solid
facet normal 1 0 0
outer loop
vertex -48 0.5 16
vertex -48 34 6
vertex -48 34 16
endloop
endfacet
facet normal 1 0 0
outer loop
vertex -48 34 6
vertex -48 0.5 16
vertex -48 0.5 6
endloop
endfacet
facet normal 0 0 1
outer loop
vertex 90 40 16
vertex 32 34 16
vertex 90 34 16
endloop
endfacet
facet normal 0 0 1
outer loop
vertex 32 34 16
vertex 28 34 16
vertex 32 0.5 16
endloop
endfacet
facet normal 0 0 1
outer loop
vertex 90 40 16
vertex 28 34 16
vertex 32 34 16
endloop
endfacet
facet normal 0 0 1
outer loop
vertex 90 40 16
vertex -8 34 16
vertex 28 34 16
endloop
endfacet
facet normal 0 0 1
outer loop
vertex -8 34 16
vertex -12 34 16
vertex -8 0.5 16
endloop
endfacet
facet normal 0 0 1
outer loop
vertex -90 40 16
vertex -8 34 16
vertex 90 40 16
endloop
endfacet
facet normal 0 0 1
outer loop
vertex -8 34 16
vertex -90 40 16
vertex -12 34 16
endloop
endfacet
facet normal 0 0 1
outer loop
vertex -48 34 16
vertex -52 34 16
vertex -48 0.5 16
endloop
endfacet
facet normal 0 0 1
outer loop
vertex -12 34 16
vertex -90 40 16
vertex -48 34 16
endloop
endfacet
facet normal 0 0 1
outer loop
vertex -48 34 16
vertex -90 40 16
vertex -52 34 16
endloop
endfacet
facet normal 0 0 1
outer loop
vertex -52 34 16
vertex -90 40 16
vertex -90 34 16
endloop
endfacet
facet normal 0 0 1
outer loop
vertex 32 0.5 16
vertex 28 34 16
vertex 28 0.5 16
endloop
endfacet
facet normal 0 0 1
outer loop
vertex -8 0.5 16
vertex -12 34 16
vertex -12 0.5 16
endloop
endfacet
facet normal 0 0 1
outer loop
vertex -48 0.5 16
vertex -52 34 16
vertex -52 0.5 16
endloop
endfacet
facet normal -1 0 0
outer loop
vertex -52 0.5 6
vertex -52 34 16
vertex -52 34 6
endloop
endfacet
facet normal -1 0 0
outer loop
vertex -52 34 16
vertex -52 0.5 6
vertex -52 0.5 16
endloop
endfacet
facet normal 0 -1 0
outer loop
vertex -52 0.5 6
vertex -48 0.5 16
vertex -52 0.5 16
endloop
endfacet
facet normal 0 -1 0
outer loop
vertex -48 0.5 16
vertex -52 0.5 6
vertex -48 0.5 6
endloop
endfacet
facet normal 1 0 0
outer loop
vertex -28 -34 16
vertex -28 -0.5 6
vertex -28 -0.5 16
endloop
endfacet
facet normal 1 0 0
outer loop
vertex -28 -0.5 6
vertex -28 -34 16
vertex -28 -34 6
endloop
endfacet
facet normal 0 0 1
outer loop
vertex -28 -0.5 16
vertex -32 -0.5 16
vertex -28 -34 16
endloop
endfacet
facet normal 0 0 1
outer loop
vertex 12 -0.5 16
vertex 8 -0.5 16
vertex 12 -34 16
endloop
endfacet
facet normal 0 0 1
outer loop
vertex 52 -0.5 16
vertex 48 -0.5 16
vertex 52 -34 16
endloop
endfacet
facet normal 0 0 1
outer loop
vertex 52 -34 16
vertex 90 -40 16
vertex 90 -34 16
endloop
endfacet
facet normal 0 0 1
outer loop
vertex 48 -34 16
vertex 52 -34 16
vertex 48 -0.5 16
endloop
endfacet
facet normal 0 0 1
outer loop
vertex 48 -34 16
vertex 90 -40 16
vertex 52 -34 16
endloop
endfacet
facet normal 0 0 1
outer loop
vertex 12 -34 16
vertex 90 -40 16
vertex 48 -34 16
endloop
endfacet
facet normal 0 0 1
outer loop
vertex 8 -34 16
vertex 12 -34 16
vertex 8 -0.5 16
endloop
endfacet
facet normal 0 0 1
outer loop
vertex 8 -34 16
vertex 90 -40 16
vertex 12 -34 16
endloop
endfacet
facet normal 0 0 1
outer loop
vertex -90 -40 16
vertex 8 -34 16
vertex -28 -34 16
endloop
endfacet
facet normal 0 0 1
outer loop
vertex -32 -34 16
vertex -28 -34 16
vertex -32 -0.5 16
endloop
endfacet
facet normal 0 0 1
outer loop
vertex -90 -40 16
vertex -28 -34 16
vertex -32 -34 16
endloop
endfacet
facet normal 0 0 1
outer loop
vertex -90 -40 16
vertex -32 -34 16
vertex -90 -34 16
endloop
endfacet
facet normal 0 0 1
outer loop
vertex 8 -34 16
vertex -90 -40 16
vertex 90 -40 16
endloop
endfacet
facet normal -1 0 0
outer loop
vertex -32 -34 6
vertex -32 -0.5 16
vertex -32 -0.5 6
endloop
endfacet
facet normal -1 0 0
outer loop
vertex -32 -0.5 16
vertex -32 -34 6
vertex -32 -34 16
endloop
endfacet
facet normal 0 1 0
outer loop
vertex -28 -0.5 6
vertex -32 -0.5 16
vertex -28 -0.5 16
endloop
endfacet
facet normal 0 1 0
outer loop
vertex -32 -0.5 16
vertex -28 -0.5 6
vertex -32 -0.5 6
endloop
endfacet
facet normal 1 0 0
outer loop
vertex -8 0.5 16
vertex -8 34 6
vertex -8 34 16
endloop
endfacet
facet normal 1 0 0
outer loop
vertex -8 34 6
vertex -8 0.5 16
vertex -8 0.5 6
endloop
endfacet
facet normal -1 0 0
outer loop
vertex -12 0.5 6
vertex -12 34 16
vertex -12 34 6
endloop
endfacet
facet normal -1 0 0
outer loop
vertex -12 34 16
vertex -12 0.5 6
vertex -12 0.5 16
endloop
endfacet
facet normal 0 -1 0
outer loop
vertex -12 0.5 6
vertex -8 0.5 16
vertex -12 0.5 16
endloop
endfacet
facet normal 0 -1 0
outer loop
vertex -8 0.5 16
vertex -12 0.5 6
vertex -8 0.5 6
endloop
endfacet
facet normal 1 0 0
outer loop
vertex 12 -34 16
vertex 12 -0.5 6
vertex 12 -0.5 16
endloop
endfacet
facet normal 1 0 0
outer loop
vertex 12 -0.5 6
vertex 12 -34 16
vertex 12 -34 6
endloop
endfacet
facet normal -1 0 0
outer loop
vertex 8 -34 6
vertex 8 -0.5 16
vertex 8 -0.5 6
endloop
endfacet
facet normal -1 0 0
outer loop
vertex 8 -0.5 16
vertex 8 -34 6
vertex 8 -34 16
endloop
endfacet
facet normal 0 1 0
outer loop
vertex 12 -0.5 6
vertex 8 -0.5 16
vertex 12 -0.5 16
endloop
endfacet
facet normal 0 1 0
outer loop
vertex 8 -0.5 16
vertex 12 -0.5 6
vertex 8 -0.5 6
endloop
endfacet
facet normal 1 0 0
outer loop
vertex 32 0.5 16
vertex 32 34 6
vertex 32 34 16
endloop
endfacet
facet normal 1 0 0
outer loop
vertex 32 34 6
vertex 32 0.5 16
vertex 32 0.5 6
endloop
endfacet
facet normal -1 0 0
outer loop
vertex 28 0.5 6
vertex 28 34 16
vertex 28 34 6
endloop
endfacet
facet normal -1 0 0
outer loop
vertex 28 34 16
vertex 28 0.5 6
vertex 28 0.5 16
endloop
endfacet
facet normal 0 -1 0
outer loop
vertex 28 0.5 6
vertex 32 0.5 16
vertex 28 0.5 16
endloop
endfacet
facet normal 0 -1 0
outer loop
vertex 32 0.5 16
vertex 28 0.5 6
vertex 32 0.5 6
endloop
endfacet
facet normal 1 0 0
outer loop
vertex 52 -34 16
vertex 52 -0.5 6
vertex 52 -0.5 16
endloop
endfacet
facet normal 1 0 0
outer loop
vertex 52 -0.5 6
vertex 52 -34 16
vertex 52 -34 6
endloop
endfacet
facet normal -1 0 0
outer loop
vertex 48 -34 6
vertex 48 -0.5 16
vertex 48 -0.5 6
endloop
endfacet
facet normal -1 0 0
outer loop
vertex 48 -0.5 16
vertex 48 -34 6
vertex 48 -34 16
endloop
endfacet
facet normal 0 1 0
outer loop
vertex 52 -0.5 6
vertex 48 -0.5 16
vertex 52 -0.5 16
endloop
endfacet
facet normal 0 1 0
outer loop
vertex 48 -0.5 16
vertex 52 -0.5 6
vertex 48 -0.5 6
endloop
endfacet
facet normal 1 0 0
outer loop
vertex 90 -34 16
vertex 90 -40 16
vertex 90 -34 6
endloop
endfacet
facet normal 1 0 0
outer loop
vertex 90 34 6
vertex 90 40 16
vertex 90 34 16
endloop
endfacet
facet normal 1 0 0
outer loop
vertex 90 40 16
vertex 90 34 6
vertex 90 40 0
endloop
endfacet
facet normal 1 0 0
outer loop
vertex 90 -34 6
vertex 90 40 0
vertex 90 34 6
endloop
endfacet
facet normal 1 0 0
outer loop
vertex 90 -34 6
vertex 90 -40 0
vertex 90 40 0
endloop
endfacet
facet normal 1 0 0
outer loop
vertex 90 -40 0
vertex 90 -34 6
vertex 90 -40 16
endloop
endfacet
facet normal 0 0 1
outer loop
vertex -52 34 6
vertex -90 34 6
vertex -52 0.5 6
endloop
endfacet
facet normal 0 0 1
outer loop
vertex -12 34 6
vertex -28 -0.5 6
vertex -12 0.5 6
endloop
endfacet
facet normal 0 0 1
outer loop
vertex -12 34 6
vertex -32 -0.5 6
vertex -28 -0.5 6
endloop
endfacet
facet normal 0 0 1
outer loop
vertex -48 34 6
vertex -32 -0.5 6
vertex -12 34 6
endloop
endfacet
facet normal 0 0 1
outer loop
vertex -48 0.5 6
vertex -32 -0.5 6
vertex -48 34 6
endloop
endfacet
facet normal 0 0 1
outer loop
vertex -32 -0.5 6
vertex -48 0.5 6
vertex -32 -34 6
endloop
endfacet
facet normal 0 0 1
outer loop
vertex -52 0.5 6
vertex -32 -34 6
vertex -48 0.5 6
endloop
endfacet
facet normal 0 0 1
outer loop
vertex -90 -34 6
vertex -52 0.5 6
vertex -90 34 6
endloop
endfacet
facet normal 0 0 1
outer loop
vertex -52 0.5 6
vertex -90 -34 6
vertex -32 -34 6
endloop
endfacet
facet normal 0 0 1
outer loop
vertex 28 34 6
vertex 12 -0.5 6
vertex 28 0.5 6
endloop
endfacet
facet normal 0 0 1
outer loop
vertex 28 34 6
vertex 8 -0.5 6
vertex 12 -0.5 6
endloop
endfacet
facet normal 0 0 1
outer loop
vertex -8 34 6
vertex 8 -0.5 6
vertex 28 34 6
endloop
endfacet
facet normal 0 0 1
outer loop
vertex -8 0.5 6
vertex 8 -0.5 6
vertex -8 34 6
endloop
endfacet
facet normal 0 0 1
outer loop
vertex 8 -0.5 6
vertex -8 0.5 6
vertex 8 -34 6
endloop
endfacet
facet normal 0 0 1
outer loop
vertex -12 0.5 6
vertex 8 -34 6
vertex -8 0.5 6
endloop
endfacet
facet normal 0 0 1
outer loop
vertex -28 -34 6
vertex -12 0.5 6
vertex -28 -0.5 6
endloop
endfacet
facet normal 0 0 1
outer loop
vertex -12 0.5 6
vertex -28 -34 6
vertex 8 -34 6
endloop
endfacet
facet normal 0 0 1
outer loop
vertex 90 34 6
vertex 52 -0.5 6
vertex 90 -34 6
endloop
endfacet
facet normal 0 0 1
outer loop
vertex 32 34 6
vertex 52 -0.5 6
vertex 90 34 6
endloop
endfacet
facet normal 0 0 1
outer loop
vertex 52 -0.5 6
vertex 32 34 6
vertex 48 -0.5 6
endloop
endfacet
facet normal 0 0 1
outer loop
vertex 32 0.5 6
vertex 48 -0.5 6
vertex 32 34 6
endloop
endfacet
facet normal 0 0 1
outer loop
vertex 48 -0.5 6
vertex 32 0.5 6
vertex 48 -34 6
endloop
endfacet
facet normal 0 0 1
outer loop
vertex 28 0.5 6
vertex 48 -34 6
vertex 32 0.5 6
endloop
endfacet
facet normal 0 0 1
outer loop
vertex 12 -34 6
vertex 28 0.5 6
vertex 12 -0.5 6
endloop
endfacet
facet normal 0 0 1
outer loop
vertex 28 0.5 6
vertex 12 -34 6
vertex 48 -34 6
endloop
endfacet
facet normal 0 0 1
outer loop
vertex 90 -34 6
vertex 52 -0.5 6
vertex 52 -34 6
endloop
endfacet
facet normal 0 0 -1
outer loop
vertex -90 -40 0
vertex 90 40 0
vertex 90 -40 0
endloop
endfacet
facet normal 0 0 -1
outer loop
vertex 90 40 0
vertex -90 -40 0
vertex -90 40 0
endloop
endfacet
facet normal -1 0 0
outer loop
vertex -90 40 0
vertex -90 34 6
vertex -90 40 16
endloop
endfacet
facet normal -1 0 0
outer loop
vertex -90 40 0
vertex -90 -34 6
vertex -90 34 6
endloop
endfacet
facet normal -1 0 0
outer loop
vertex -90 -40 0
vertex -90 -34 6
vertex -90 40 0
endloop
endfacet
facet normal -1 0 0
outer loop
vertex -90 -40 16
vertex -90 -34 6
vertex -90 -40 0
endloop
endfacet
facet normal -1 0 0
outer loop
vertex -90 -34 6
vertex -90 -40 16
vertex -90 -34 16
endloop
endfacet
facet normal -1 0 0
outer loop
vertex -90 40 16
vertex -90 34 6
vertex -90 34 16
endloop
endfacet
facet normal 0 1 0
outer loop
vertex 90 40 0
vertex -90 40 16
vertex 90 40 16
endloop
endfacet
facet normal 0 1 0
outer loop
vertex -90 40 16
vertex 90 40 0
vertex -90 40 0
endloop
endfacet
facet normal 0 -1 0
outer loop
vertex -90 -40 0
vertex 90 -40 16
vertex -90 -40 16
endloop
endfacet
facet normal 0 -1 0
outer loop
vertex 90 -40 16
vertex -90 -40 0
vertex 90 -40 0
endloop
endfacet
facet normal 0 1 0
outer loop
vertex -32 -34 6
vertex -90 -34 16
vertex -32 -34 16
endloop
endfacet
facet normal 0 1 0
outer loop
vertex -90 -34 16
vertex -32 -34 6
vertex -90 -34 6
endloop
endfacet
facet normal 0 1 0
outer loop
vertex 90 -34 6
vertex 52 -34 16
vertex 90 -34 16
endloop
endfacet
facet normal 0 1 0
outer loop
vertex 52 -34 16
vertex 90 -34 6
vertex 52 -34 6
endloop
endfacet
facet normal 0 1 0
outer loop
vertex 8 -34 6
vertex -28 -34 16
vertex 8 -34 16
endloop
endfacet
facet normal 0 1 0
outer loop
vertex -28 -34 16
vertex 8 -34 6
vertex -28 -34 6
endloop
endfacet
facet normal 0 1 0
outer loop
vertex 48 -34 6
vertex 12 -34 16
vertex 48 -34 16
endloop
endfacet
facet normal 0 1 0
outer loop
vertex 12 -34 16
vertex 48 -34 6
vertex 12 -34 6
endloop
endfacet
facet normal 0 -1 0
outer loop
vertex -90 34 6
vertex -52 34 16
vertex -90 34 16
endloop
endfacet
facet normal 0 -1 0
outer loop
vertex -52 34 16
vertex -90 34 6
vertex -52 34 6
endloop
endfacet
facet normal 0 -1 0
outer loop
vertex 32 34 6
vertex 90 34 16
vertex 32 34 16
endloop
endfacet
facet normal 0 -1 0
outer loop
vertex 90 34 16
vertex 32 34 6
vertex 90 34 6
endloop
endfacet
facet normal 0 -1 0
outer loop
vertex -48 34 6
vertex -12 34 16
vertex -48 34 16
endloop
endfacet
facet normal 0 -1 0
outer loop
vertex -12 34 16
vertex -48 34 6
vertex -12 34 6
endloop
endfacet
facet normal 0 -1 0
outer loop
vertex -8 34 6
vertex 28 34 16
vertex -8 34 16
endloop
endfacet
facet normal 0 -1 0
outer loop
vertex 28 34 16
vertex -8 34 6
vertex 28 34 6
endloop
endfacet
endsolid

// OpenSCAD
$fn = 32;

// ----------------------------------------------------------------------
// Rib frame 180 x 80 x 16
// 6 ribs at 20 mm pitch, staggered
// ----------------------------------------------------------------------

// --- parameters (mm) ---
frame = [180, 80, 6];  // base plate size (x, y, z)
rail_w = 6;            // side rail width
ribs = 6;              // number of ribs
rib_t = 4;             // rib thickness
rib_h = 10;            // rib height above the base plate
pitch = 20;            // pitch between rib centres

// --- derived feature positions (mm) ---
span = (ribs - 1) * pitch;          // = 100   distance between the outer ribs
origin_x = -span / 2;               // = -50   X of the first rib
rib_len = frame[1] / 2 - rail_w + 0.5;  // = 34.5   length of a staggered rib
rib_y = 0.5 + rib_len / 2;          // = 17.75   Y of a staggered rib centre
row_offset = 2 * rib_y;             // = 35.5   distance between the two rows
feature_centers = [
  [origin_x + 0 * pitch, rib_y],
  [origin_x + 1 * pitch, -rib_y],
  [origin_x + 2 * pitch, rib_y],
  [origin_x + 3 * pitch, -rib_y],
  [origin_x + 4 * pitch, rib_y],
  [origin_x + 5 * pitch, -rib_y]
];   // rib centre line, drives the rib loop

// base plate, two side rails, then the ribs read straight off feature_centers
union() {
  translate([-frame[0] / 2, -frame[1] / 2, 0]) cube(frame);
  translate([-frame[0] / 2, -frame[1] / 2, 0]) cube([frame[0], rail_w, frame[2] + rib_h]);
  translate([-frame[0] / 2, frame[1] / 2 - rail_w, 0]) cube([frame[0], rail_w, frame[2] + rib_h]);
  for (centre = feature_centers)
    translate([centre[0] - rib_t / 2, centre[1] - rib_len / 2, frame[2] - 1])
      cube([rib_t, rib_len, rib_h + 1]);
}
